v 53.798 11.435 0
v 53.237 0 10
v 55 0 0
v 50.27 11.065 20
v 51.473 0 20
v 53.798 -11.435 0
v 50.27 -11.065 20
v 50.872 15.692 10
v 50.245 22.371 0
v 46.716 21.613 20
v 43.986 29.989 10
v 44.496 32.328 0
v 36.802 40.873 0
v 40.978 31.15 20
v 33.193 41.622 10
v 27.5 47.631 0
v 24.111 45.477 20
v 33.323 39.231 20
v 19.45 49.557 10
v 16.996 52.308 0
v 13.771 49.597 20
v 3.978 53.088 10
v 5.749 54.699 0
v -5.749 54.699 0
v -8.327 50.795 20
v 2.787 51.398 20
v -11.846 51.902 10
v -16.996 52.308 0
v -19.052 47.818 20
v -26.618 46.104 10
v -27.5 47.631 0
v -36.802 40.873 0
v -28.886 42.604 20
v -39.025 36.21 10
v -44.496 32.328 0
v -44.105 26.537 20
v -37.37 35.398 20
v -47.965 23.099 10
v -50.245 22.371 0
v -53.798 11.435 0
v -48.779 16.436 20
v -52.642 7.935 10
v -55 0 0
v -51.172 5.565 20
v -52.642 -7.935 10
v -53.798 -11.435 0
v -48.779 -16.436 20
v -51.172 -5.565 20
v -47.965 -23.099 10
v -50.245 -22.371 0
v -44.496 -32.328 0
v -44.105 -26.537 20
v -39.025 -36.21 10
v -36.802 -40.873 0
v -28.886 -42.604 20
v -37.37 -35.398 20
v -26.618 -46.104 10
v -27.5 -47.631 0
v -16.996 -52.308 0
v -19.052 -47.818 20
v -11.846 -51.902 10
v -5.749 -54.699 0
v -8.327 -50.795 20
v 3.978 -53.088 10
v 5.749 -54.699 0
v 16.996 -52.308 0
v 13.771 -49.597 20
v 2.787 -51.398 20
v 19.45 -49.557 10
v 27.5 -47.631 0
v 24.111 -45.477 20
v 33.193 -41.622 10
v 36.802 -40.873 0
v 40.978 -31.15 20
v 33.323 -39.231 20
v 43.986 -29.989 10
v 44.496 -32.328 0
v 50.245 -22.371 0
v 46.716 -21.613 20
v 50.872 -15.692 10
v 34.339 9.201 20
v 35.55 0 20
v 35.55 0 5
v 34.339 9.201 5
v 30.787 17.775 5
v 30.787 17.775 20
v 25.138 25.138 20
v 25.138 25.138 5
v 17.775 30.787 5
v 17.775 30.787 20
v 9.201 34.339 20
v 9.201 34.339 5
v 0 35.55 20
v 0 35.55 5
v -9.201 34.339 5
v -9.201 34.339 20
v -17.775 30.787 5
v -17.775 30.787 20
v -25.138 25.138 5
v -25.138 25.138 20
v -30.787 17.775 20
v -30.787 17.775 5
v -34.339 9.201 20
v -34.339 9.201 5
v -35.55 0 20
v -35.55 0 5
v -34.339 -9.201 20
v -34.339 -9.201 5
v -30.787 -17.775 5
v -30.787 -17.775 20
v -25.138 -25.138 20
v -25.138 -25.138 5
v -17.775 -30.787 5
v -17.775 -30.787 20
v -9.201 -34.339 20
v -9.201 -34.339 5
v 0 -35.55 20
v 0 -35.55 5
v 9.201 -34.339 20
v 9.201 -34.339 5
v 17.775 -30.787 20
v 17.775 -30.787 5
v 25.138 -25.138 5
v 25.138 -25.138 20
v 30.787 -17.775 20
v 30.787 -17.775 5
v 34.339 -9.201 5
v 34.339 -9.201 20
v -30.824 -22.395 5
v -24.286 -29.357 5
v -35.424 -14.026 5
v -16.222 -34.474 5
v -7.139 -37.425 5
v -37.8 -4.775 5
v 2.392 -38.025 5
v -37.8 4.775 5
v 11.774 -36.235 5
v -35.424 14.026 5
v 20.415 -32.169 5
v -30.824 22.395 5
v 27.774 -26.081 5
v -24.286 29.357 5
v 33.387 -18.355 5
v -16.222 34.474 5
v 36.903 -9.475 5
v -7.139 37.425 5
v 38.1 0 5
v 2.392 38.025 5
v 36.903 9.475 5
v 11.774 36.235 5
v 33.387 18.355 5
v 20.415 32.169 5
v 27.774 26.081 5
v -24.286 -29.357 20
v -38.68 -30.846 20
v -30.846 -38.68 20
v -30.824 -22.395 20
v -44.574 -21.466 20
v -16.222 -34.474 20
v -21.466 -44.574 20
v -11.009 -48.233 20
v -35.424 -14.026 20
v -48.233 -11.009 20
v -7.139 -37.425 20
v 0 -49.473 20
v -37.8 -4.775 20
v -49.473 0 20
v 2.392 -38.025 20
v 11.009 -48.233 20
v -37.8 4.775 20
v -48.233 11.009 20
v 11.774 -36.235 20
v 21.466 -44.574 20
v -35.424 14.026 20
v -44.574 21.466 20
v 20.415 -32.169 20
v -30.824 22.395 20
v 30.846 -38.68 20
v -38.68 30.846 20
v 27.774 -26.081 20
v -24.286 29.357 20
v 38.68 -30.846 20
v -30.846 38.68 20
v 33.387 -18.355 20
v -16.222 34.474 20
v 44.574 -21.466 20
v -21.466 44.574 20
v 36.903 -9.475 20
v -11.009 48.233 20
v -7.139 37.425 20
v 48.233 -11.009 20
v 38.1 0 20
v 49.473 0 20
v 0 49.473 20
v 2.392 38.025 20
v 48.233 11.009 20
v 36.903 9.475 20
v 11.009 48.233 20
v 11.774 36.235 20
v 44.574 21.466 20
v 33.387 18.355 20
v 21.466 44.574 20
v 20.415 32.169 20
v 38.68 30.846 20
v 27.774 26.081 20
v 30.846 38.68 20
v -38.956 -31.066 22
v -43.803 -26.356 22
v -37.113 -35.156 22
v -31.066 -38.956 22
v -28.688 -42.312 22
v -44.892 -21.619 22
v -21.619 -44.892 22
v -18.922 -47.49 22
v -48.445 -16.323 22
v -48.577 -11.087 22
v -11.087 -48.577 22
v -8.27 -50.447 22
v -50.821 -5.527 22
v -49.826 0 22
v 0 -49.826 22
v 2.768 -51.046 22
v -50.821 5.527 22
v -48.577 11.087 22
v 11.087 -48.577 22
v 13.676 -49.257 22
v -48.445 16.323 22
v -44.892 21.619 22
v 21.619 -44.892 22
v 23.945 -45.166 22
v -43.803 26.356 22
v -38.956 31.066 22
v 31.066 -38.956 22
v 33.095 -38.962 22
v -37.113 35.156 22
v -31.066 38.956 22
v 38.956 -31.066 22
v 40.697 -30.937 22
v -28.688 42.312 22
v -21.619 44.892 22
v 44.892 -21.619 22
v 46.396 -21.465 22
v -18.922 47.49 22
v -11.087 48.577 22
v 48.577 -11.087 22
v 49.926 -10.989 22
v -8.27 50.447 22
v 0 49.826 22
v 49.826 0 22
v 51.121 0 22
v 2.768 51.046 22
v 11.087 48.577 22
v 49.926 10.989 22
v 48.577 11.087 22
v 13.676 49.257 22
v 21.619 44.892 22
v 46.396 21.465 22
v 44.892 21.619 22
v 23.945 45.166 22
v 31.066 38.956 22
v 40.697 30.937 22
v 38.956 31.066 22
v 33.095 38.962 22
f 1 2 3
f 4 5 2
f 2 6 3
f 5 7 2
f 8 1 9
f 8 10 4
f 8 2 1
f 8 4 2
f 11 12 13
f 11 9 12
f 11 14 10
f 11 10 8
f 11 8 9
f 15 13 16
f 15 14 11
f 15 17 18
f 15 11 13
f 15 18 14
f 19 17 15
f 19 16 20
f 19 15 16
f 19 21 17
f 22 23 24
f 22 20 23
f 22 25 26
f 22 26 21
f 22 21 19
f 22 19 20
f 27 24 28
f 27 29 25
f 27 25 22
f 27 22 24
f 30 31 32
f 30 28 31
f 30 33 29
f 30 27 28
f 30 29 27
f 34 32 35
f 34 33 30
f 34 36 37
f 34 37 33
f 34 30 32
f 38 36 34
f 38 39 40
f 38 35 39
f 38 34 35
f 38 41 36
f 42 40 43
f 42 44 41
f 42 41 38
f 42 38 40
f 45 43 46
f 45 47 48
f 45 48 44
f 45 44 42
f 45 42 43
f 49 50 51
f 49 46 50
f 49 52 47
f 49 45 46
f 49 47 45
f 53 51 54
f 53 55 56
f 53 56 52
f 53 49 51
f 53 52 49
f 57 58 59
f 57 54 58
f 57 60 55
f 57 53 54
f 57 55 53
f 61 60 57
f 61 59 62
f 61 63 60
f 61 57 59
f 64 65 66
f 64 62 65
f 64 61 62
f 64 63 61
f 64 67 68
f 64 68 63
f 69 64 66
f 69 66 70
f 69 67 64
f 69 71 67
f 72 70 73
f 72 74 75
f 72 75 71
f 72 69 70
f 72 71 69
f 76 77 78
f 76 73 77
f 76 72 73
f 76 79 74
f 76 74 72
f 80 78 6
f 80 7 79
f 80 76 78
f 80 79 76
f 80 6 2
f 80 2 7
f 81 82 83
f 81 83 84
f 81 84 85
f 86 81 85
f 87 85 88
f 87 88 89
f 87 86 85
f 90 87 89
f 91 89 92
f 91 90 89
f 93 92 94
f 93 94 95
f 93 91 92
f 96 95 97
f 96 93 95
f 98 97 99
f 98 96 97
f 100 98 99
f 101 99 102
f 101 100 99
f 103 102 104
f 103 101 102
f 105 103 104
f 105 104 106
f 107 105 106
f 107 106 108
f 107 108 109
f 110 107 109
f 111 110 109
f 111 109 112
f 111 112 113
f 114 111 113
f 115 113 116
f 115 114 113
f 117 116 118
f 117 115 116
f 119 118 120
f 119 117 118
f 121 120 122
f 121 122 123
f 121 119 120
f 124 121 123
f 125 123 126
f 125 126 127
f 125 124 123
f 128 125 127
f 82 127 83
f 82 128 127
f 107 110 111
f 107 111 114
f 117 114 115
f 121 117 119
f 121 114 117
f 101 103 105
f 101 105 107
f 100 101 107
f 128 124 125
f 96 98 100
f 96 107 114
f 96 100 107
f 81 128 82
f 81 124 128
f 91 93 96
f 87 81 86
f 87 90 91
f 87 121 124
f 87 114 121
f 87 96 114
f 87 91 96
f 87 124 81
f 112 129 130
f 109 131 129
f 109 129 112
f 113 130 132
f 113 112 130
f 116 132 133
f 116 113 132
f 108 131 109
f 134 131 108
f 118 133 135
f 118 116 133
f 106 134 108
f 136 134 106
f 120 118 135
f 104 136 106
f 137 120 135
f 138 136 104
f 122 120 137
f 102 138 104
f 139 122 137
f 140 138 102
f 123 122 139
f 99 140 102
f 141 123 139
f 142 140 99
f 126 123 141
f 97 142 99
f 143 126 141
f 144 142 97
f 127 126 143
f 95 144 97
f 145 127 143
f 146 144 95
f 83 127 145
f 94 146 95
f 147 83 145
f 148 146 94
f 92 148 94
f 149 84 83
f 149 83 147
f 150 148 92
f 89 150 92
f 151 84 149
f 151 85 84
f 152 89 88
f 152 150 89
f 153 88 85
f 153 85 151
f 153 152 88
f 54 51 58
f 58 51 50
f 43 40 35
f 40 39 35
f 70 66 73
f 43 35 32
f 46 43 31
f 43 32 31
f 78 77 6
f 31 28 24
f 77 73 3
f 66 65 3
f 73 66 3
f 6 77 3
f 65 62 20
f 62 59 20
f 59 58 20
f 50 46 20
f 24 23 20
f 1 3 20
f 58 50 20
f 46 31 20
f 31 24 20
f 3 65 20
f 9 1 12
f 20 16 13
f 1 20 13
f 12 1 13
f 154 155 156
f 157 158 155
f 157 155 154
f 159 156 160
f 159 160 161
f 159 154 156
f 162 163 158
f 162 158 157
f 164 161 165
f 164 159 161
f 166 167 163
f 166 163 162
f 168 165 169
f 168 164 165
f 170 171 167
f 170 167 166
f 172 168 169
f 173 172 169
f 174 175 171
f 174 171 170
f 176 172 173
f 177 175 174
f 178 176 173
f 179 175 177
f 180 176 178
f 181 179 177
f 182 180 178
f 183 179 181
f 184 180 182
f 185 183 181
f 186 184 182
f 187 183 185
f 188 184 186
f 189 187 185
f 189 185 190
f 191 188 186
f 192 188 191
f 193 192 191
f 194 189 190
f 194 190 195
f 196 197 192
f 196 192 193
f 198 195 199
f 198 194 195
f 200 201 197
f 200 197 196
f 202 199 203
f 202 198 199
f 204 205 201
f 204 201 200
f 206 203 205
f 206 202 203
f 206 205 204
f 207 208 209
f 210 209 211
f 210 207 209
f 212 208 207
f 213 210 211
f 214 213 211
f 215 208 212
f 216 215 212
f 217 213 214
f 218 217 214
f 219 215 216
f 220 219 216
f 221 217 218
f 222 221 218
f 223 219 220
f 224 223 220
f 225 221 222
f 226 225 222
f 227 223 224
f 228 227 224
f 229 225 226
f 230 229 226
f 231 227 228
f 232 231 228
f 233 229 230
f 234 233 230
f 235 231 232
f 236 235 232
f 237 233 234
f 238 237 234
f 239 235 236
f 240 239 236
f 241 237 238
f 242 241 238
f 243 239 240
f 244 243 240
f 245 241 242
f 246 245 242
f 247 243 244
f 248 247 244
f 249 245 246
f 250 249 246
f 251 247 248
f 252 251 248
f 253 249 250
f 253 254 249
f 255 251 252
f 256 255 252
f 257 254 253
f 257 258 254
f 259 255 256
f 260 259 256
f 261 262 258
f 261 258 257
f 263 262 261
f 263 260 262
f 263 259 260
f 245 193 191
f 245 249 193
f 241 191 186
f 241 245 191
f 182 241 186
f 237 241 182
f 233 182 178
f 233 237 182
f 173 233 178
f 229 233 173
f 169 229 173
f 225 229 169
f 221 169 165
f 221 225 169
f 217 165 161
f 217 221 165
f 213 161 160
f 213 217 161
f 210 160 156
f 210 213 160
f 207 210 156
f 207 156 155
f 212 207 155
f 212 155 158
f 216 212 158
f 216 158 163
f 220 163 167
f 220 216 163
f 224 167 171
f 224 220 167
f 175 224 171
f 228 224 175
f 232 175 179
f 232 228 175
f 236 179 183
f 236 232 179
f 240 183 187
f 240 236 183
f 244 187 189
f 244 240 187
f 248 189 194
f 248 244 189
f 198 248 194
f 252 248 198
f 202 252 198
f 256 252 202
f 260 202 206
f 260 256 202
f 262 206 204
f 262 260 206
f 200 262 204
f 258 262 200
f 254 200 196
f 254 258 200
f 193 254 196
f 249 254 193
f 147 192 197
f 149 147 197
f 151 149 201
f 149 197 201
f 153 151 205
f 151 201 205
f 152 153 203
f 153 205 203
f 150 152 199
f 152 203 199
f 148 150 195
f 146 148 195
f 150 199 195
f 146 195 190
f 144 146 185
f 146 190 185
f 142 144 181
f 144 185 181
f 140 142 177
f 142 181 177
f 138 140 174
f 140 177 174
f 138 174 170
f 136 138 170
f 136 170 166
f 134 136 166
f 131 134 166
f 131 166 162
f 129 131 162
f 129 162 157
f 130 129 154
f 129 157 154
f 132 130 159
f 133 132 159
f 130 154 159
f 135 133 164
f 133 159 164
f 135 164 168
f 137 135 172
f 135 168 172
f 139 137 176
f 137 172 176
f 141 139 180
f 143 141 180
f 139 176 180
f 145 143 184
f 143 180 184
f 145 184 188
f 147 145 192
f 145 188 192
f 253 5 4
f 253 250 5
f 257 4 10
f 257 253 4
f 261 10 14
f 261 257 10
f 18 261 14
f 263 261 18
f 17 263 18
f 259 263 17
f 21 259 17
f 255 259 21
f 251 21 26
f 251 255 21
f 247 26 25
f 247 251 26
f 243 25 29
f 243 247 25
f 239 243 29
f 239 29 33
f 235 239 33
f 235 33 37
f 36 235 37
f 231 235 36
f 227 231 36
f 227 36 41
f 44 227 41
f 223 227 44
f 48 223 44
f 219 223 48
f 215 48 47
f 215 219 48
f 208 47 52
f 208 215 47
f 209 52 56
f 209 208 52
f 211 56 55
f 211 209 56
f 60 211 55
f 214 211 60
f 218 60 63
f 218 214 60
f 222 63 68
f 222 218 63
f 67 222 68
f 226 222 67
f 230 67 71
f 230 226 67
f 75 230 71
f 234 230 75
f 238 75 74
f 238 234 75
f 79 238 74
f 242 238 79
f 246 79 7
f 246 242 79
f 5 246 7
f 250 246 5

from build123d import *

# Parameters (mm, degrees)
SKETCH1_R           = 55
BOSS_EXTRUDE1_DEPTH = 20
BOSS_EXTRUDE1_TAPER = 10
SKETCH2_R           = 38.1
SKETCH2_R_2         = 35.55
CUT_EXTRUDE1_DEPTH  = 15
SKETCH3_R           = 51.473460386
SKETCH3_R_2         = 49.473460386
BOSS_EXTRUDE2_DEPTH = 2
BOSS_EXTRUDE2_TAPER = 10


with BuildPart() as part:
    # Sketch1 → Boss-Extrude1 (new body)
    with BuildSketch(Plane.XY):
        Circle(SKETCH1_R)
    extrude(amount=BOSS_EXTRUDE1_DEPTH, taper=BOSS_EXTRUDE1_TAPER)

    # Sketch2 → Cut-Extrude1 (cut)
    with BuildSketch(Plane.XY.offset(20)):
        Circle(SKETCH2_R)
        Circle(SKETCH2_R_2, mode=Mode.SUBTRACT)
    extrude(amount=-CUT_EXTRUDE1_DEPTH, mode=Mode.SUBTRACT)

    # Sketch3 → Boss-Extrude2 (add)
    with BuildSketch(Plane.XY.offset(20)):
        Circle(SKETCH3_R)
        Circle(SKETCH3_R_2, mode=Mode.SUBTRACT)
    extrude(amount=BOSS_EXTRUDE2_DEPTH, taper=BOSS_EXTRUDE2_TAPER)


solid = part.part
